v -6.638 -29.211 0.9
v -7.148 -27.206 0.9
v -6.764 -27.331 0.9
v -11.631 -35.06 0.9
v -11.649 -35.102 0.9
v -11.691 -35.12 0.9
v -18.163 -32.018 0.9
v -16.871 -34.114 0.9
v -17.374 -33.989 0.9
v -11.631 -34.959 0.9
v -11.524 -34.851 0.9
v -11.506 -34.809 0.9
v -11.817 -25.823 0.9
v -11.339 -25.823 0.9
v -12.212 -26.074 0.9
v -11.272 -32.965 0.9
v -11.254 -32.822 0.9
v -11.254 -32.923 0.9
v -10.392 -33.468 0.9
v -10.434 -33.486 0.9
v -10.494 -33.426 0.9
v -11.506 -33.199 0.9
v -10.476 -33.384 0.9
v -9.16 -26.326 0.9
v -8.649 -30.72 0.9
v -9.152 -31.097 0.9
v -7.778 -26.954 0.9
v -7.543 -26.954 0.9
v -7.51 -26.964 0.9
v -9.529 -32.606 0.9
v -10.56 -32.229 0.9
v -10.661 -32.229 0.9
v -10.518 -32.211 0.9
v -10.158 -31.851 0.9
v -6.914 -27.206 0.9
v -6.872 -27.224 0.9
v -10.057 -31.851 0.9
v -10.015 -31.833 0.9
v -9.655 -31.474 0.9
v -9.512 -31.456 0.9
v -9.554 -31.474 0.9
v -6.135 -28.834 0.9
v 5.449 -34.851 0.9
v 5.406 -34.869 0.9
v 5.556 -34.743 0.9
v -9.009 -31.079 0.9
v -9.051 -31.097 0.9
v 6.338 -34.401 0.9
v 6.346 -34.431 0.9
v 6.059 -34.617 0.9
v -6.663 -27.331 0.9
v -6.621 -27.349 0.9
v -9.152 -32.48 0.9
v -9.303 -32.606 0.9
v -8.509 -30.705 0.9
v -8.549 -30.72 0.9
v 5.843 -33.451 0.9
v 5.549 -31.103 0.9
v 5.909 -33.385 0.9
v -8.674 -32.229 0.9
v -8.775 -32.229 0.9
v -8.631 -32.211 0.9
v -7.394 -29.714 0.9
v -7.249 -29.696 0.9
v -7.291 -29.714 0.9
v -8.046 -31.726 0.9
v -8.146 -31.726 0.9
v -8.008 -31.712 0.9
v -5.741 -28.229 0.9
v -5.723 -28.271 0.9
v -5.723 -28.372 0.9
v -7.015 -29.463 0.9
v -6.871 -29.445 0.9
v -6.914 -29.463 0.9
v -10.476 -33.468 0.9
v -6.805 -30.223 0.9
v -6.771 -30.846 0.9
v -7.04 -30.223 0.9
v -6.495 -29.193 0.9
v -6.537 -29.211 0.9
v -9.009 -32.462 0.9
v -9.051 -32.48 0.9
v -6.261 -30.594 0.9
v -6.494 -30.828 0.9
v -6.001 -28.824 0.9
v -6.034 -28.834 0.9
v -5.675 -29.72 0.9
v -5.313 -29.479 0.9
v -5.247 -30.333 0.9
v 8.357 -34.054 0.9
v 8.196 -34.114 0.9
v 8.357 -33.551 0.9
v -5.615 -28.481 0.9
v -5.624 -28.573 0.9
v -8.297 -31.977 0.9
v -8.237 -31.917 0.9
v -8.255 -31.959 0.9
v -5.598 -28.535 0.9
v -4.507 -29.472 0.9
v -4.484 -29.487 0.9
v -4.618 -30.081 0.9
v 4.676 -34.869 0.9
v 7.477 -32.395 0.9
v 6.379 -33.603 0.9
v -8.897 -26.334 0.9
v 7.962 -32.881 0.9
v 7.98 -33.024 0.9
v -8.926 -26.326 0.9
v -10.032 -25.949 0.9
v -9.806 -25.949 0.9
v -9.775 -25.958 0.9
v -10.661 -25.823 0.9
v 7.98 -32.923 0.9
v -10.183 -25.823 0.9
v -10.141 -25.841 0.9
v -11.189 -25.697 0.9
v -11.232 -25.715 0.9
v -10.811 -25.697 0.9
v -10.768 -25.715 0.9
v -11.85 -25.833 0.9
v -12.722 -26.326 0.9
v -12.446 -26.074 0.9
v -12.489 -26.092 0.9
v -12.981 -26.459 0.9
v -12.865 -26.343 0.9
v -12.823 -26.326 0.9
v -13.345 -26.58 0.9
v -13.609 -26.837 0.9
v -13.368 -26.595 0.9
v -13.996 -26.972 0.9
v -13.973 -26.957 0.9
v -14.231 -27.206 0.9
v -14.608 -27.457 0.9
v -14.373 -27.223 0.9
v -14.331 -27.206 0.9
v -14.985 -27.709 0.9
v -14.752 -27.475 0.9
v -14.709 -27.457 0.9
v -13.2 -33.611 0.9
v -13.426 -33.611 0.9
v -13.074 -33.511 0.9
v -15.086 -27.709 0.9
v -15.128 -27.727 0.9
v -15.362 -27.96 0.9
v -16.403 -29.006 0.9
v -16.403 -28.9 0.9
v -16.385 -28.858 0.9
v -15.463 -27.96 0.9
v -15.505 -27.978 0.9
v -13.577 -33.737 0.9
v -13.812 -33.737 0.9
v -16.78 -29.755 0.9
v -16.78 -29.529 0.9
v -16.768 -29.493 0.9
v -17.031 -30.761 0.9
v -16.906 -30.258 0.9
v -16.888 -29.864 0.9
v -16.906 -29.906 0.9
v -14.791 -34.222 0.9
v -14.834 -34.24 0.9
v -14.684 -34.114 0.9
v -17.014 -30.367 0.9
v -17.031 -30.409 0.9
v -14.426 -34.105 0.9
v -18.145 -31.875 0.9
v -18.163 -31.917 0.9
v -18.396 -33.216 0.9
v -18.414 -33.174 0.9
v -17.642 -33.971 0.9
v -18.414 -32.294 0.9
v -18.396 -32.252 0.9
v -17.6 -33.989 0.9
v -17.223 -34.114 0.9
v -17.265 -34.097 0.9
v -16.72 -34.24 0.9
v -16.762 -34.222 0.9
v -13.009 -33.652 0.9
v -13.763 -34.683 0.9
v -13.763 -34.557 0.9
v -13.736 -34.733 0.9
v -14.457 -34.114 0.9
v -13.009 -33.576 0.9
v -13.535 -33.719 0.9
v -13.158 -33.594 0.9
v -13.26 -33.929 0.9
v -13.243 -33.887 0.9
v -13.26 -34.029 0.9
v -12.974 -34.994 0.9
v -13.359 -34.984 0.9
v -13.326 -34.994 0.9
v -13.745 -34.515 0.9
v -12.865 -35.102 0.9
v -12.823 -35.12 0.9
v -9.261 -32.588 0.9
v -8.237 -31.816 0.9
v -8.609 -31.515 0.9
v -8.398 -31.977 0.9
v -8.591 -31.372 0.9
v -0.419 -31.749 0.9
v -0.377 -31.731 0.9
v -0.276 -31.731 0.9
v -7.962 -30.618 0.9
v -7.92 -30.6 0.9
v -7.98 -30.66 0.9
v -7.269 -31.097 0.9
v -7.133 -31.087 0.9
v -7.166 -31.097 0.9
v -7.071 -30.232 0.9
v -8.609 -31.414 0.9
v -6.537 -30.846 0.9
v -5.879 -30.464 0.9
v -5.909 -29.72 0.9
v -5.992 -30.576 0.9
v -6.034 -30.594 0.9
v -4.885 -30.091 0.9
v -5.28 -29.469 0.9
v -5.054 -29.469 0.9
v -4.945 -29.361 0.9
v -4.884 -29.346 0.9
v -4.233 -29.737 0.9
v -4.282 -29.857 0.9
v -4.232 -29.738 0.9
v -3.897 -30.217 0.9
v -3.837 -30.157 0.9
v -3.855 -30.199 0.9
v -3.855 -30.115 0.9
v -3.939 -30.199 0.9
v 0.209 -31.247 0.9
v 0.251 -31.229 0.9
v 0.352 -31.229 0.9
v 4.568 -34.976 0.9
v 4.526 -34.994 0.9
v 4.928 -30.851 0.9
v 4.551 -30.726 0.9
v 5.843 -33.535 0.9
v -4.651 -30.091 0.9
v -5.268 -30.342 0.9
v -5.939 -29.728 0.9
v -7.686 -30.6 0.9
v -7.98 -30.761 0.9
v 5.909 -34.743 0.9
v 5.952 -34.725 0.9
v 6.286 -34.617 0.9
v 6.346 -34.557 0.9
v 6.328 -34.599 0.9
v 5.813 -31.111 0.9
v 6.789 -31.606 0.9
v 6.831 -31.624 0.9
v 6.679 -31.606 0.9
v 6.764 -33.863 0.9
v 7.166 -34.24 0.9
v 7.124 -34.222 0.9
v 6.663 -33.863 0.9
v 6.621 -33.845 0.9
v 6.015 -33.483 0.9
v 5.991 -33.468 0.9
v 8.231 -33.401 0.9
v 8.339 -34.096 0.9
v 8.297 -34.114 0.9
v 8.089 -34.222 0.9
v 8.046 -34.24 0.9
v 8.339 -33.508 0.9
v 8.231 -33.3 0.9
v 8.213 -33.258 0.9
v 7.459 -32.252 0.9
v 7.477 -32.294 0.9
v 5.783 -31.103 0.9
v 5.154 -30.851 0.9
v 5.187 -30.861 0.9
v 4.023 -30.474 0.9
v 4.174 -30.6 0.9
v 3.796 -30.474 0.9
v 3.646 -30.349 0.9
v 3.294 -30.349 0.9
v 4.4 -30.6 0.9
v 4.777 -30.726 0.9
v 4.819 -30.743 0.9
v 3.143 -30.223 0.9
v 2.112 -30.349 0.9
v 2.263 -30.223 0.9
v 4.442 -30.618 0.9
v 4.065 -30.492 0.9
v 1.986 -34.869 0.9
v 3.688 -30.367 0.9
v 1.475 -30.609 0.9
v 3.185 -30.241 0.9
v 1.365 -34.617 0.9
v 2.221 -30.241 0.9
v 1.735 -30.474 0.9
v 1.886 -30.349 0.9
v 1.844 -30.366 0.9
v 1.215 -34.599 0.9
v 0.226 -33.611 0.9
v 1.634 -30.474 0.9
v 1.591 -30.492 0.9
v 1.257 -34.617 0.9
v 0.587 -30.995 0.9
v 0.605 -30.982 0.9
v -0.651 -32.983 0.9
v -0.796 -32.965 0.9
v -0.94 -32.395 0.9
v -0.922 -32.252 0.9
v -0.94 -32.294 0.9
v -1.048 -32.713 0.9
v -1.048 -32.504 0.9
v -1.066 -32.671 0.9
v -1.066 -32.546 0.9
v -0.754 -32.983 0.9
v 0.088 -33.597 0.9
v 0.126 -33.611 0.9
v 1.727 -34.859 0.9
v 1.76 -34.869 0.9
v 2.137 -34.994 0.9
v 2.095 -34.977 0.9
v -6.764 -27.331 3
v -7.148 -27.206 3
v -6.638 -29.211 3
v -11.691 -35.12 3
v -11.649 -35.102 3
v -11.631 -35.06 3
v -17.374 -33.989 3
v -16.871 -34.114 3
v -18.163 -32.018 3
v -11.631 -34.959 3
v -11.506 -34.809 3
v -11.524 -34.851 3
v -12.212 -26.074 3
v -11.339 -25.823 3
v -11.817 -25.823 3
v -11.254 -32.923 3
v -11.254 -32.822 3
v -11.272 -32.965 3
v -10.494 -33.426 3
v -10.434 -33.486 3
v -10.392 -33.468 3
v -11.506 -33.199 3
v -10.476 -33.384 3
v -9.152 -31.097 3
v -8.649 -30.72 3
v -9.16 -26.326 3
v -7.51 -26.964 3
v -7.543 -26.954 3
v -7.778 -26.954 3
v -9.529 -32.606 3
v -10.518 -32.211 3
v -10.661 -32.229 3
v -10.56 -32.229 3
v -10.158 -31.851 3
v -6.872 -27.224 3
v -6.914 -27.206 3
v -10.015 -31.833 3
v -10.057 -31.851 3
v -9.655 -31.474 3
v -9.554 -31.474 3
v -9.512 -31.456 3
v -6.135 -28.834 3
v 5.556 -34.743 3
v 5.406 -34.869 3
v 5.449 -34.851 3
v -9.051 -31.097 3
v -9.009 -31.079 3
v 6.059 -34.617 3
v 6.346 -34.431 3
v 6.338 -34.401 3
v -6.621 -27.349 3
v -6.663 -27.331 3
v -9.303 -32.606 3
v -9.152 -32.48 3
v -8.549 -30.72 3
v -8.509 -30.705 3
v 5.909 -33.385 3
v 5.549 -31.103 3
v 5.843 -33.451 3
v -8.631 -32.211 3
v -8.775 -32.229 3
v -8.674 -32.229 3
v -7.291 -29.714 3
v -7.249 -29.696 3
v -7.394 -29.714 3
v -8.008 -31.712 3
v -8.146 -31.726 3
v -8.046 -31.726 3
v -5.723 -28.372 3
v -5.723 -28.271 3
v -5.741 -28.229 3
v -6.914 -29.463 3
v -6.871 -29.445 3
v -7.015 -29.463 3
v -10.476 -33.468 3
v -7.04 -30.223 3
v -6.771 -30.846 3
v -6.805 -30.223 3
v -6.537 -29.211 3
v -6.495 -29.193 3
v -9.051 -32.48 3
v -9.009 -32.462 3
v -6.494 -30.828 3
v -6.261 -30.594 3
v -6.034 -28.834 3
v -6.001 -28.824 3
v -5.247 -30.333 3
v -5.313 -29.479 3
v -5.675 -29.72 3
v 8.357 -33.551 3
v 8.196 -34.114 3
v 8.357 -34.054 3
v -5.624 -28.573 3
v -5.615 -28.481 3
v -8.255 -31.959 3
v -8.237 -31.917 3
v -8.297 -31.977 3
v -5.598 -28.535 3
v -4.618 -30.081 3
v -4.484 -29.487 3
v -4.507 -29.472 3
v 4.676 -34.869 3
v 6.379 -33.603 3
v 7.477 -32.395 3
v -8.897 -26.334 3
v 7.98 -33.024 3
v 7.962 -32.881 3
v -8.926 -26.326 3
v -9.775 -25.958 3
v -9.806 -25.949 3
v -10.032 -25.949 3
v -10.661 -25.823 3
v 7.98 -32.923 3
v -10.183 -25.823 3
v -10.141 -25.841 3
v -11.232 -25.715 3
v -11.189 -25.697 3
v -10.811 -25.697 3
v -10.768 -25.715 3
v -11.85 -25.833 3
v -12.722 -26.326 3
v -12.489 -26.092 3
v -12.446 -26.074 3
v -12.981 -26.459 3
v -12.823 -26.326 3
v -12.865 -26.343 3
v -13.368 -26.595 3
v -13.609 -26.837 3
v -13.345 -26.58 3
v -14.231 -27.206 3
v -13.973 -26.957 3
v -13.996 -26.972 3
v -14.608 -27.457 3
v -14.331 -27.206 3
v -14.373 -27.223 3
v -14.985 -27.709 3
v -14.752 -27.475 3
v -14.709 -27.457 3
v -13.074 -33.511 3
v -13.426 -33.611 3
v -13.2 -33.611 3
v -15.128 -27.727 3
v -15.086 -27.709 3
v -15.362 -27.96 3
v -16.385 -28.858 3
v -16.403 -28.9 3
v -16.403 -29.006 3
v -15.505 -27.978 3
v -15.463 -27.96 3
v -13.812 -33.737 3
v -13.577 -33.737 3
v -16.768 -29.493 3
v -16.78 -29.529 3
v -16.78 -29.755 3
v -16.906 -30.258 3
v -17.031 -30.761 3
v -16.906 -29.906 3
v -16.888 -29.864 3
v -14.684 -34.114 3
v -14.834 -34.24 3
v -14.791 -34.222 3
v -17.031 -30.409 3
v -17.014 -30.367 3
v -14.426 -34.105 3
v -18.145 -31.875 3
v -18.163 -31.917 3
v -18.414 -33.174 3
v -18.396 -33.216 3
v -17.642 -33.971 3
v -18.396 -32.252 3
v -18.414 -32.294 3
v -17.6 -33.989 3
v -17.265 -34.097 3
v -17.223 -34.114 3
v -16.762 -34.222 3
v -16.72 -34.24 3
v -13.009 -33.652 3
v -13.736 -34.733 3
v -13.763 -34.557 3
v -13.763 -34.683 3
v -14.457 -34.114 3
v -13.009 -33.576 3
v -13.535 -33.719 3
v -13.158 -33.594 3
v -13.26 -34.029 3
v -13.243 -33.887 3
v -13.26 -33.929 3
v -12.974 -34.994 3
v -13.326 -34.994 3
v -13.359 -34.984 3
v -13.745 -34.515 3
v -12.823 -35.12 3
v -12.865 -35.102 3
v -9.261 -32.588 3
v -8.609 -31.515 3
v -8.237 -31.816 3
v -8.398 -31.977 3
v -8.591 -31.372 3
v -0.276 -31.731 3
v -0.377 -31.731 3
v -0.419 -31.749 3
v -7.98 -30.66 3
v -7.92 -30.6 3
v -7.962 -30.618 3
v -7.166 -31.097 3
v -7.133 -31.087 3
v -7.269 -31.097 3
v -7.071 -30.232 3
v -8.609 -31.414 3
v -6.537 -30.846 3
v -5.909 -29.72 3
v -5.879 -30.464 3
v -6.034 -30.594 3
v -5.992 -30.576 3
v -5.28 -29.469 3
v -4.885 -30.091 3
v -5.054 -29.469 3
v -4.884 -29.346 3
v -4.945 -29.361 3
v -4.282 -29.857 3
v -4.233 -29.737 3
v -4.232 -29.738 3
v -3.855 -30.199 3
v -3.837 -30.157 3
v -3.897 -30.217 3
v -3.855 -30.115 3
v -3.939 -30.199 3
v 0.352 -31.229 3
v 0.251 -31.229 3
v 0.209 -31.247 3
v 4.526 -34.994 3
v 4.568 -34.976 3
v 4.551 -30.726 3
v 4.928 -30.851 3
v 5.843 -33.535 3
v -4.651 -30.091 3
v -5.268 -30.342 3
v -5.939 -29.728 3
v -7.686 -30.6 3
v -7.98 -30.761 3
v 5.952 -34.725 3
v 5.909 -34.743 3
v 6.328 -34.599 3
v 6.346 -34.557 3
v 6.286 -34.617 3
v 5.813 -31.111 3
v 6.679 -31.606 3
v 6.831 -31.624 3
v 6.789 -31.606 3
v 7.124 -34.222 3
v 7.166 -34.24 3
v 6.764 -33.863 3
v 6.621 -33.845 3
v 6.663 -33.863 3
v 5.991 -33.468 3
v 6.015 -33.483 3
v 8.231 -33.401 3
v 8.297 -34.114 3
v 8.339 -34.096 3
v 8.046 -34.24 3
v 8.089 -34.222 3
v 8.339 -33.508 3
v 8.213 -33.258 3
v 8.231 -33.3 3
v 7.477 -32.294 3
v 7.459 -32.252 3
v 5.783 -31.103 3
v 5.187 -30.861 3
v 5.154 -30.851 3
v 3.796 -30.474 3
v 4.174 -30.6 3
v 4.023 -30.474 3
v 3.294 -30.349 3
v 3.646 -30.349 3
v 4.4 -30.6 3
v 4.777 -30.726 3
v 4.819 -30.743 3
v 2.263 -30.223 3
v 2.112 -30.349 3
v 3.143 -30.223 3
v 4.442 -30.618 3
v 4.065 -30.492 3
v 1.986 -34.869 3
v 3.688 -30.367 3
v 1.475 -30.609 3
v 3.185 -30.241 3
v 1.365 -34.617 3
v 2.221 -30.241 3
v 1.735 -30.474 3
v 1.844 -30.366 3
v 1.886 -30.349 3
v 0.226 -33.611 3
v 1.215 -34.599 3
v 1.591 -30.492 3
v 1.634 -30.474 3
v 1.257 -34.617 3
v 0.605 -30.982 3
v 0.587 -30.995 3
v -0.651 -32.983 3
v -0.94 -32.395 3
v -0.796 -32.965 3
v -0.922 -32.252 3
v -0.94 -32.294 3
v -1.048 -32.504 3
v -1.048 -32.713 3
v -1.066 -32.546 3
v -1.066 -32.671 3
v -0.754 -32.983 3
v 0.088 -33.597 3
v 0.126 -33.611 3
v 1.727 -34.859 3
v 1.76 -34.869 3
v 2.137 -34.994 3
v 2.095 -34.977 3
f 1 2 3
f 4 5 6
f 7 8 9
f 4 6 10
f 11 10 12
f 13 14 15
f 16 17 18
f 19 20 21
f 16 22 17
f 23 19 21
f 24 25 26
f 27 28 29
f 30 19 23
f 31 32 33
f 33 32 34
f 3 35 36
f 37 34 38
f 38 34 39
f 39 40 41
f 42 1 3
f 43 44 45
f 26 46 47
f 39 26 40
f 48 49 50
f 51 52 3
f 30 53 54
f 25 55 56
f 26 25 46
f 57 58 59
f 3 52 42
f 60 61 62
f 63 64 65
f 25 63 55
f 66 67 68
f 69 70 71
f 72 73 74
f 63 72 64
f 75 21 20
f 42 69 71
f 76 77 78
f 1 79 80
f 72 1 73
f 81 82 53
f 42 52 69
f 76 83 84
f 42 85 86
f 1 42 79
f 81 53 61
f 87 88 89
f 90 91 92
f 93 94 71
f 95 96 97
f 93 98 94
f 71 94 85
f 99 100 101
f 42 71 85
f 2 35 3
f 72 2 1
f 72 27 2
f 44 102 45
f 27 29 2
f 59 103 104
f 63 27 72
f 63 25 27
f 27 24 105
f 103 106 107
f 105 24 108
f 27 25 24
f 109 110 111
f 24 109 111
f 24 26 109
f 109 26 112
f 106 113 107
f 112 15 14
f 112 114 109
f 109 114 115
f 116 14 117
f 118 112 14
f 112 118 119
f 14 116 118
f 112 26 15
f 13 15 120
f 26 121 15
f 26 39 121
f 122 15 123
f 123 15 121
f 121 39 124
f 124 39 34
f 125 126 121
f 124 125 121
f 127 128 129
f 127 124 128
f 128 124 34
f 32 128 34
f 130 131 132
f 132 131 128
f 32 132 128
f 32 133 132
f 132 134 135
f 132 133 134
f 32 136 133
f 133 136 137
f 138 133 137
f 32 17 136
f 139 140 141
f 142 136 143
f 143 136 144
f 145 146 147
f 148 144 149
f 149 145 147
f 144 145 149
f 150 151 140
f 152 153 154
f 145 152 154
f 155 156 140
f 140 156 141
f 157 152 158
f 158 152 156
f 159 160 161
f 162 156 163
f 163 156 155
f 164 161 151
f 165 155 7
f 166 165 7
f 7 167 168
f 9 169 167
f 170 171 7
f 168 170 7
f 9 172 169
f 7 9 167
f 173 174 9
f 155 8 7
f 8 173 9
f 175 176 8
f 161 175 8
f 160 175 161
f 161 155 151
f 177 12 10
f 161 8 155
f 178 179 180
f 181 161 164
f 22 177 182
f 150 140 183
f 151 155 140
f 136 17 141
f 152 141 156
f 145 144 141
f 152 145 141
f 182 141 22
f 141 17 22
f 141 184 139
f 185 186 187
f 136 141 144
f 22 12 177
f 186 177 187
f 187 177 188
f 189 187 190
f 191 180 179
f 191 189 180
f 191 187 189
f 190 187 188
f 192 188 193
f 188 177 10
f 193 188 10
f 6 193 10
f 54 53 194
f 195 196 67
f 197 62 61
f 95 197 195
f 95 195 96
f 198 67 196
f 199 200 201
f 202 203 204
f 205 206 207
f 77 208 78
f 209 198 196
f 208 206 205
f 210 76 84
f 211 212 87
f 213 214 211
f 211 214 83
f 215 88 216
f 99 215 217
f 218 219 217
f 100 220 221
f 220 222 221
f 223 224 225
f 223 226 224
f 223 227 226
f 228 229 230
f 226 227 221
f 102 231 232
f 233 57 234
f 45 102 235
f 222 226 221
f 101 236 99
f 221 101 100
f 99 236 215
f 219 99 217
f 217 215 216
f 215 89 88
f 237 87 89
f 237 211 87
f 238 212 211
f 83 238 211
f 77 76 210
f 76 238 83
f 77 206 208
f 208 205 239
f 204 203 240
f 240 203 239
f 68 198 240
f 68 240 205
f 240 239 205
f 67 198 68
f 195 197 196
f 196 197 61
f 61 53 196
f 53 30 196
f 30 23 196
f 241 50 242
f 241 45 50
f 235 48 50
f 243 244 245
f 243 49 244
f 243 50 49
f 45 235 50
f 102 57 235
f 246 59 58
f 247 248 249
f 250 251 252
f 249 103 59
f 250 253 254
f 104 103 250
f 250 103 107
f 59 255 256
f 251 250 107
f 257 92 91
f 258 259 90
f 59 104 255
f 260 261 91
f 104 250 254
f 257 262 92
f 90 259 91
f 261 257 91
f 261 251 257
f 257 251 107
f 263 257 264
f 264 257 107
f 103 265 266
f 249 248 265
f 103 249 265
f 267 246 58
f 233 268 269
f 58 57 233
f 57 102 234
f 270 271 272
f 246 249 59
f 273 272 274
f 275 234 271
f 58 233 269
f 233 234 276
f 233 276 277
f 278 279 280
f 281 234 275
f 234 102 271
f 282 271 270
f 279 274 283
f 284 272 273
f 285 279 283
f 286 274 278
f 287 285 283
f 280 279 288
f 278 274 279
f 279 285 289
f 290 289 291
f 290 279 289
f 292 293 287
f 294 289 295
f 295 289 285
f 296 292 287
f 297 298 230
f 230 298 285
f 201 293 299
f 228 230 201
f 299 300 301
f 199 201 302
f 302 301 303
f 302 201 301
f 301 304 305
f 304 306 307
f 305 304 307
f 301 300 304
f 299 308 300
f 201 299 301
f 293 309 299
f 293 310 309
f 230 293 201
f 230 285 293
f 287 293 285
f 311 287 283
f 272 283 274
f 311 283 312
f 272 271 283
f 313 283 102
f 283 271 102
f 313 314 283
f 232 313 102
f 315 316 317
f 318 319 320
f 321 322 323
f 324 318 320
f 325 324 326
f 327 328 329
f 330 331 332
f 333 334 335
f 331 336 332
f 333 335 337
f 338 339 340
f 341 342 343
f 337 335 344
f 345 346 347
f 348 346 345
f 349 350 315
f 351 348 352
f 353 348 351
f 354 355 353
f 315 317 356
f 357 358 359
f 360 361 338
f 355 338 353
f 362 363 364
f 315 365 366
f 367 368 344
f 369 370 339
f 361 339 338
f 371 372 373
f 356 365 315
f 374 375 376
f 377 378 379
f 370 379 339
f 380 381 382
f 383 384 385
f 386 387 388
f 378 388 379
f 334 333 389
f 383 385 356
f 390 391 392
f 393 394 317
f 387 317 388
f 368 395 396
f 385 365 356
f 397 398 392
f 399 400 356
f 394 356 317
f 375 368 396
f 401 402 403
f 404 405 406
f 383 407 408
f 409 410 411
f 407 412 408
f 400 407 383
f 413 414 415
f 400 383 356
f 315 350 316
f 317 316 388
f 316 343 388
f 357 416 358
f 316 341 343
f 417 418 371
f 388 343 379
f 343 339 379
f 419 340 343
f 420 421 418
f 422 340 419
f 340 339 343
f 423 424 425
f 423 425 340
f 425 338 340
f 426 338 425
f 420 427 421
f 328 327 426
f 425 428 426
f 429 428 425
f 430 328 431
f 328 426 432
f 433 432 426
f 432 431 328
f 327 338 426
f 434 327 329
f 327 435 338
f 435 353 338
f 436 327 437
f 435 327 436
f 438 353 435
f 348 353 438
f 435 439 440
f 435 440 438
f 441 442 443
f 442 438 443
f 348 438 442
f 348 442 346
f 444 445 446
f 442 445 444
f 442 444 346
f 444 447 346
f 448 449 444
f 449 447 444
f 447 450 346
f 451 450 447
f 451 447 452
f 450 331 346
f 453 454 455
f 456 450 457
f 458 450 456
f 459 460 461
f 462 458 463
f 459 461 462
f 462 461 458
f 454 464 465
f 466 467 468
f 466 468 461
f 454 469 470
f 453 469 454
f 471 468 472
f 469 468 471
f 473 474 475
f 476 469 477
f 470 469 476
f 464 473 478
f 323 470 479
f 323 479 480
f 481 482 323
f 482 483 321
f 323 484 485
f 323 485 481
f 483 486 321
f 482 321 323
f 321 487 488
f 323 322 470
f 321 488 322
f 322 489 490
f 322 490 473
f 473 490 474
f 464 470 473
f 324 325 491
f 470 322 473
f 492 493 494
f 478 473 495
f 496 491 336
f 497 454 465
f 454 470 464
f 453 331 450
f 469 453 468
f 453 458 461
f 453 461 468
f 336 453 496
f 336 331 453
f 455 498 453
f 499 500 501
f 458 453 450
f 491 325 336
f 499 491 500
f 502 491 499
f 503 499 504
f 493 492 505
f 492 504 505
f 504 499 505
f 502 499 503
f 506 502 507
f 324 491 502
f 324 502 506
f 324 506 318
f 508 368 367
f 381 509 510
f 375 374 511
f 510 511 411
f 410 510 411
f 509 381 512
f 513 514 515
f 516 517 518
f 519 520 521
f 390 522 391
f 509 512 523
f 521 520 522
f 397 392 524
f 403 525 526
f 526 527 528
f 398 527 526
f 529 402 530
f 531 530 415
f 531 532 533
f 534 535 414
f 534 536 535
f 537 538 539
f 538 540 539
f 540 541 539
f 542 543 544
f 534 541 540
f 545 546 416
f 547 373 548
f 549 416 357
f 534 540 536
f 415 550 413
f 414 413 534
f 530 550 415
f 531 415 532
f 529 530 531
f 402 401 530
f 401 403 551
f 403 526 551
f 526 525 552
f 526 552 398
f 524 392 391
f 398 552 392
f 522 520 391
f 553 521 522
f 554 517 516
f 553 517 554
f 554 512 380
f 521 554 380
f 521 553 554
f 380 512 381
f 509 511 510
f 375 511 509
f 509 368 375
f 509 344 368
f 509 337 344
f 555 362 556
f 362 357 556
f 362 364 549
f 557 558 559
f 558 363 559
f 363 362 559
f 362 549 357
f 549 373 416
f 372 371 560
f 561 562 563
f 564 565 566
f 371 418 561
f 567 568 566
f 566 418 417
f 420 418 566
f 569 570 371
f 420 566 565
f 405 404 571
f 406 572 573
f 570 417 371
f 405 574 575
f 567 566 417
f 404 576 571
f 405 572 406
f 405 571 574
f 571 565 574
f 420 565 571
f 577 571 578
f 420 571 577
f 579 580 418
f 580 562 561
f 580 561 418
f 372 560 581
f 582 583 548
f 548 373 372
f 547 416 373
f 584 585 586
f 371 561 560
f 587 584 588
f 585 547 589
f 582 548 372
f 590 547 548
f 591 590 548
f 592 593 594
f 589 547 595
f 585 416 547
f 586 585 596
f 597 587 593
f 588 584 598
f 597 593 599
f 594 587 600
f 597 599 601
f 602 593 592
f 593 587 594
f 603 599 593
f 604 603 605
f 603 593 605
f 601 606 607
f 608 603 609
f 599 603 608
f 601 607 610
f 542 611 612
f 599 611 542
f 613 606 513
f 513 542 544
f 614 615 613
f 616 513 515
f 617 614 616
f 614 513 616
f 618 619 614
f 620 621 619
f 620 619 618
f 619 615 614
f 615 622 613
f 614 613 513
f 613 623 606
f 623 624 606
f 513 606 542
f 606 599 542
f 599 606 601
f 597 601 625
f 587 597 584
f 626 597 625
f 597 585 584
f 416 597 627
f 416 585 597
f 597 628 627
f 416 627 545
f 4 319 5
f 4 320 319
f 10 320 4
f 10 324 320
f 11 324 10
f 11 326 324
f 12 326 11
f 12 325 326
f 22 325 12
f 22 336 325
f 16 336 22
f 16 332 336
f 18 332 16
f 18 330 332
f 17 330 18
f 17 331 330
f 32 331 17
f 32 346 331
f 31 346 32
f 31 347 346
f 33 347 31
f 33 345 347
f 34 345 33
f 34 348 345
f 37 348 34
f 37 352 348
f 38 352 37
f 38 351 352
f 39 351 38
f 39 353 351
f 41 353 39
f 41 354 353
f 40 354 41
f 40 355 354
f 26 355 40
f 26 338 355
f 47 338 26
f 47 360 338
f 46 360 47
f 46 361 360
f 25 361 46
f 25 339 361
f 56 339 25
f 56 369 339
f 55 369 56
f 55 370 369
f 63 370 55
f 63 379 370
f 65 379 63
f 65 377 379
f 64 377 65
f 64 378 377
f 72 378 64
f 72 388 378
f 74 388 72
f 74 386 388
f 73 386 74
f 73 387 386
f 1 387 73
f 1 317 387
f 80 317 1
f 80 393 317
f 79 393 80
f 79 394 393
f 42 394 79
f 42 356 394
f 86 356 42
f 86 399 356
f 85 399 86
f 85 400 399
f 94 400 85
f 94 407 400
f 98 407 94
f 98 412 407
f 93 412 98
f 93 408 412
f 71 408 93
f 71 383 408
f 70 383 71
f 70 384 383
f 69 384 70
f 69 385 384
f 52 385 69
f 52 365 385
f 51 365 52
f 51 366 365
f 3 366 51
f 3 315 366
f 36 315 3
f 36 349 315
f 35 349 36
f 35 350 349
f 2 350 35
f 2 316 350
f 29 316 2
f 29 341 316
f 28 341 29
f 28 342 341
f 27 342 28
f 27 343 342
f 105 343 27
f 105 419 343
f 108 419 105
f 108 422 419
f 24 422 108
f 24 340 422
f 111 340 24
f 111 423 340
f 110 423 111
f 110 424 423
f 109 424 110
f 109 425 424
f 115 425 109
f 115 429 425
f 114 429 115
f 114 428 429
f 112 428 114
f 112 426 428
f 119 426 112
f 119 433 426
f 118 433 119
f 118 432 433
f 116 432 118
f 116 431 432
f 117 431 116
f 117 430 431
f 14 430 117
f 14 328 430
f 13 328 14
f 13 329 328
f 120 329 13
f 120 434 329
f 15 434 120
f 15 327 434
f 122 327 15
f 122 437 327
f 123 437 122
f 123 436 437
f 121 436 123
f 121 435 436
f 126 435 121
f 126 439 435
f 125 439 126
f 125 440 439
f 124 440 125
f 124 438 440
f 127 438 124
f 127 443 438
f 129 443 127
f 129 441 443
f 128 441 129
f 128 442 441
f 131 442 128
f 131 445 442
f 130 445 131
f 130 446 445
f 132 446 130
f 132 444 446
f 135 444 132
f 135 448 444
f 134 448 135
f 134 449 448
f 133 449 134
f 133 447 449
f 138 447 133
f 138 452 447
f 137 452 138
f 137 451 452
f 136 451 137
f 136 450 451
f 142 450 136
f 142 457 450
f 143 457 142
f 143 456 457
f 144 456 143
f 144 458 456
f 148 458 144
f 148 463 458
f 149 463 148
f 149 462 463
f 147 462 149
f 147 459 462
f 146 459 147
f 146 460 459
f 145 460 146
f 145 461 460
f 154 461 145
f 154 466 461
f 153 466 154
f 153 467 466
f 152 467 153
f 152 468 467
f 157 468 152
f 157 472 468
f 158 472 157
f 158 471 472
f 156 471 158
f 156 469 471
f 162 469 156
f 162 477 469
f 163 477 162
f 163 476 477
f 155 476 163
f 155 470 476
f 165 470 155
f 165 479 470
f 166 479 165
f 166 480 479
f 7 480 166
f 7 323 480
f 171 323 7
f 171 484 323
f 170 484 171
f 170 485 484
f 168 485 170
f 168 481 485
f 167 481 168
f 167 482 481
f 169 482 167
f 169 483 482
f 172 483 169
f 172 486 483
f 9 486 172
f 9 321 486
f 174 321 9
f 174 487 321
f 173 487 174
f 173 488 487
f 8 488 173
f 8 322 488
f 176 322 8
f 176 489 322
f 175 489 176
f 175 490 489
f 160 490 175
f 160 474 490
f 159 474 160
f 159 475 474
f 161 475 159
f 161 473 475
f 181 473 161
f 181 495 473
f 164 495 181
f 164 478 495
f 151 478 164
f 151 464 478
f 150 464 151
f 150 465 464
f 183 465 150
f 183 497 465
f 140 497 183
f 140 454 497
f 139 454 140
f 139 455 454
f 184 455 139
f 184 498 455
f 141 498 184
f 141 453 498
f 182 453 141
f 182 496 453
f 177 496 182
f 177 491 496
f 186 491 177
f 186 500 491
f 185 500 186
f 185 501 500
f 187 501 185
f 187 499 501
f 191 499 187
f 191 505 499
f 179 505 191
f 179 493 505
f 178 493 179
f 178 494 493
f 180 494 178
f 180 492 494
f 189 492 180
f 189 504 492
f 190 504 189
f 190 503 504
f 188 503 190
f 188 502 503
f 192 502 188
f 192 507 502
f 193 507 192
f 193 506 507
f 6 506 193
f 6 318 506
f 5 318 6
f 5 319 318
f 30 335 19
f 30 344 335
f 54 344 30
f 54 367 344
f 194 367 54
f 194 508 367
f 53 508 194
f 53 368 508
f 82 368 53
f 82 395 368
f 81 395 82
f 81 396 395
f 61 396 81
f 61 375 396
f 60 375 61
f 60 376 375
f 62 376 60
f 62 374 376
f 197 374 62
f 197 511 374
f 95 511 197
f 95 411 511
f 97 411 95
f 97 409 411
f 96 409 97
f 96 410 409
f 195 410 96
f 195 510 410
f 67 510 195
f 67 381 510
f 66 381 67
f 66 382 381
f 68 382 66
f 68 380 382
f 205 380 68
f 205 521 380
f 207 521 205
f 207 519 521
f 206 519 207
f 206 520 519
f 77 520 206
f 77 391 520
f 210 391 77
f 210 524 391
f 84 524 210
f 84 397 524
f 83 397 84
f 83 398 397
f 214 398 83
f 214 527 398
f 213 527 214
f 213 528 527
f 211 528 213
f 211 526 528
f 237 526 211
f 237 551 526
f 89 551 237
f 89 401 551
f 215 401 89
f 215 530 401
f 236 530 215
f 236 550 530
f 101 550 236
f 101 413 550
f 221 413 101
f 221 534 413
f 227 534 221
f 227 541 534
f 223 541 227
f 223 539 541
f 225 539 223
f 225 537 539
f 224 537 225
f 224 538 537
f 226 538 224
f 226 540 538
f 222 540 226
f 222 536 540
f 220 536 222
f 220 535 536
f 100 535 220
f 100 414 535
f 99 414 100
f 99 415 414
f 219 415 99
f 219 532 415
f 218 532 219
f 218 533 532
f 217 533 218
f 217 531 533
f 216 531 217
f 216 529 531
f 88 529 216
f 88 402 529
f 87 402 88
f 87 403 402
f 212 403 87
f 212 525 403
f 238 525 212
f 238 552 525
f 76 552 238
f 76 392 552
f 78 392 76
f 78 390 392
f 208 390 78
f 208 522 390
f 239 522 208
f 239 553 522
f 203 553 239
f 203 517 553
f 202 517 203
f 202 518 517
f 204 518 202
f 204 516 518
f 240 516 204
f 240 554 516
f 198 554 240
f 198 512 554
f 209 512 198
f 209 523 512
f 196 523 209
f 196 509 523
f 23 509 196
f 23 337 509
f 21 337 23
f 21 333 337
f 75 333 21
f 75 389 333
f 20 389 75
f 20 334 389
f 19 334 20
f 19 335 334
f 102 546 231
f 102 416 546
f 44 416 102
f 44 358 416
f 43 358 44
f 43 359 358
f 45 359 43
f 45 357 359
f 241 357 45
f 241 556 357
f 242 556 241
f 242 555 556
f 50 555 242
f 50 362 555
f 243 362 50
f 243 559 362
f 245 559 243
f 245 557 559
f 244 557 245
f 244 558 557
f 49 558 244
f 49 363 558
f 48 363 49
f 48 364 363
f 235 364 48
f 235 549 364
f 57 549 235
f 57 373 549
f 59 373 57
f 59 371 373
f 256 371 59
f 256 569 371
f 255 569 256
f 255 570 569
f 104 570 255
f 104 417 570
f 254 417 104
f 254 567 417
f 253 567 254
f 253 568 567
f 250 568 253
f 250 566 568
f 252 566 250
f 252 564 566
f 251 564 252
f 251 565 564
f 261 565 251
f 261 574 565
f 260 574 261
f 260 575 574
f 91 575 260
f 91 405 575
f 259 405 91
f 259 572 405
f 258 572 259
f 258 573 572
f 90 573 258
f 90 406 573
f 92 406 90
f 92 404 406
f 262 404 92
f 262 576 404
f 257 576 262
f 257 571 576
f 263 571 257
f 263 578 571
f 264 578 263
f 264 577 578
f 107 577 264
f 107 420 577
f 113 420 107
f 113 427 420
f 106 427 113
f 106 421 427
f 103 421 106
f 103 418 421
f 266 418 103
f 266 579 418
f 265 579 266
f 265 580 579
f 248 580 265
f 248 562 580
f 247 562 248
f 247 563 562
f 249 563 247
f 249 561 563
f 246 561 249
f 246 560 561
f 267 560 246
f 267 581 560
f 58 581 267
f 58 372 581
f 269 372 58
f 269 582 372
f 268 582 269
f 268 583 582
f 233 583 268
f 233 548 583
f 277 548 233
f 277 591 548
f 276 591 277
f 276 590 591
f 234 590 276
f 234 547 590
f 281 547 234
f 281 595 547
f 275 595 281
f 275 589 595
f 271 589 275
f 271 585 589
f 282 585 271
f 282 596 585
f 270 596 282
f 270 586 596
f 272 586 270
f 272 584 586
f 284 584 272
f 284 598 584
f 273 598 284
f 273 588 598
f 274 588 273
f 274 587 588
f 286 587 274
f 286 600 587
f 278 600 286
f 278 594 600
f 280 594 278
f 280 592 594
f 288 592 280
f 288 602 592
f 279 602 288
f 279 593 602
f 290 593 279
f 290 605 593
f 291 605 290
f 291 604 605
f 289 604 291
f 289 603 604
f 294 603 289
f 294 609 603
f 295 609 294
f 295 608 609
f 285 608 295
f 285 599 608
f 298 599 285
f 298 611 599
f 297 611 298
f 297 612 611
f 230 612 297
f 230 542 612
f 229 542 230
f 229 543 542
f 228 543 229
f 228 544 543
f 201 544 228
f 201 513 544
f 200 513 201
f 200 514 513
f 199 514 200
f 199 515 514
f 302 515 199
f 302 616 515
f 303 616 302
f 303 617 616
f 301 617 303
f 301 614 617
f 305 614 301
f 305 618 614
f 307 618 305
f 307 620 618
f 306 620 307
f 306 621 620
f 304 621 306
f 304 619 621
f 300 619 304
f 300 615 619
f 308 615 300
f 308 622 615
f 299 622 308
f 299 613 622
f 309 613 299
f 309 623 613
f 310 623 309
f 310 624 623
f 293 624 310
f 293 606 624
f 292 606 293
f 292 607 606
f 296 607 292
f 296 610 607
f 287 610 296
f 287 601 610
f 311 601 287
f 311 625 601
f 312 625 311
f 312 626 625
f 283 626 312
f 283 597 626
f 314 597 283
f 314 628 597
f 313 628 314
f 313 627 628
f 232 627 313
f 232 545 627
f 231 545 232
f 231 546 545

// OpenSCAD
$fn = 24;
translate([0, -2.500, 0.900])
  linear_extrude(height=2.100) {
offset(r=0.06, $fn=8) {
    polygon(points=[[-1.006,-30.046],[-1.006,-30.171],[-0.754,-30.423],[-0.629,-30.423],[0.126,-31.051],[0.251,-31.051],[1.257,-32.057],[1.383,-32.057],[1.760,-32.309],[2.011,-32.309],[2.137,-32.434],[4.526,-32.434],[4.651,-32.309],[5.406,-32.309],[5.531,-32.183],[5.909,-32.183],[6.034,-32.057],[6.286,-32.057],[6.286,-31.931],[5.783,-31.051],[5.783,-30.926],[5.909,-30.800],[6.034,-30.926],[6.411,-31.051],[6.663,-31.303],[6.789,-31.303],[7.166,-31.680],[8.046,-31.680],[8.171,-31.554],[8.297,-31.554],[8.297,-31.051],[8.171,-30.926],[8.171,-30.800],[7.920,-30.549],[7.920,-30.423],[7.417,-29.920],[7.417,-29.794],[6.789,-29.166],[6.663,-29.166],[5.783,-28.663],[5.531,-28.663],[5.154,-28.411],[4.903,-28.411],[4.777,-28.286],[4.526,-28.286],[4.400,-28.160],[4.149,-28.160],[4.023,-28.034],[3.771,-28.034],[3.646,-27.909],[3.269,-27.909],[3.143,-27.783],[2.263,-27.783],[2.137,-27.909],[1.886,-27.909],[1.760,-28.034],[1.634,-28.034],[1.509,-28.160],[0.629,-28.537],[0.377,-28.789],[0.251,-28.789],[-0.251,-29.291],[-0.377,-29.291],[-0.880,-29.794],[-0.880,-29.920]], paths=[[0,1,2,3,4,5,6,7,8,9,10,11,12,13,14,15,16,17,18,19,20,21,22,23,24,25,26,27,28,29,30,31,32,33,34,35,36,37,38,39,40,41,42,43,44,45,46,47,48,49,50,51,52,53,54,55,56,57,58,59,60,61,62,63,64]]);
    polygon(points=[[-3.897,-27.657],[-4.526,-27.029],[-4.903,-26.903],[-5.029,-27.029],[-5.280,-27.029],[-5.657,-27.280],[-5.909,-27.280],[-6.789,-27.783],[-7.040,-27.783],[-7.669,-28.160],[-7.920,-28.160],[-7.920,-28.286],[-8.549,-28.914],[-8.549,-29.040],[-10.434,-30.926],[-10.434,-31.051],[-10.434,-30.926],[-9.554,-30.046],[-9.303,-30.046],[-9.177,-29.920],[-9.051,-29.920],[-8.800,-29.669],[-8.674,-29.669],[-8.423,-29.417],[-8.297,-29.417],[-8.297,-29.291],[-8.171,-29.166],[-8.046,-29.166],[-7.291,-28.537],[-7.166,-28.537],[-6.789,-28.286],[-6.537,-28.286],[-6.286,-28.034],[-6.034,-28.034],[-5.909,-27.909],[-5.280,-27.783],[-4.903,-27.531],[-4.651,-27.531],[-4.274,-27.280]], paths=[[0,1,2,3,4,5,6,7,8,9,10,11,12,13,14,15,16,17,18,19,20,21,22,23,24,25,26,27,28,29,30,31,32,33,34,35,36,37,38]]);
    polygon(points=[[-5.657,-26.023],[-5.783,-25.897],[-5.783,-25.771],[-6.663,-24.891],[-6.789,-24.891],[-6.914,-24.766],[-7.166,-24.766],[-7.543,-24.514],[-7.794,-24.514],[-8.926,-23.886],[-9.177,-23.886],[-9.806,-23.509],[-10.057,-23.509],[-10.183,-23.383],[-10.686,-23.383],[-10.811,-23.257],[-11.189,-23.257],[-11.314,-23.383],[-11.817,-23.383],[-12.194,-23.634],[-12.446,-23.634],[-12.697,-23.886],[-12.823,-23.886],[-12.949,-24.011],[-13.326,-24.137],[-13.577,-24.389],[-13.954,-24.514],[-14.206,-24.766],[-14.331,-24.766],[-14.583,-25.017],[-14.709,-25.017],[-14.960,-25.269],[-15.086,-25.269],[-15.337,-25.520],[-15.463,-25.520],[-16.343,-26.400],[-16.343,-26.526],[-16.720,-27.029],[-16.720,-27.280],[-16.846,-27.406],[-16.846,-27.783],[-16.971,-27.909],[-16.971,-28.286],[-18.103,-29.417],[-18.103,-29.543],[-18.354,-29.794],[-18.354,-30.674],[-17.600,-31.429],[-17.349,-31.429],[-17.223,-31.554],[-16.846,-31.554],[-16.720,-31.680],[-14.834,-31.680],[-14.709,-31.554],[-14.457,-31.554],[-13.829,-31.177],[-13.577,-31.177],[-13.451,-31.051],[-13.200,-31.051],[-13.074,-30.926],[-12.949,-31.051],[-12.949,-31.177],[-13.200,-31.429],[-13.200,-31.554],[-13.703,-32.057],[-13.703,-32.183],[-13.326,-32.434],[-12.949,-32.434],[-12.823,-32.560],[-11.691,-32.560],[-11.691,-32.434],[-11.566,-32.309],[-11.566,-30.674],[-11.314,-30.423],[-11.314,-30.297],[-10.686,-29.669],[-10.560,-29.669],[-10.183,-29.291],[-10.057,-29.291],[-9.680,-28.914],[-9.554,-28.914],[-9.177,-28.537],[-9.051,-28.537],[-8.674,-28.160],[-8.549,-28.160],[-7.417,-27.154],[-7.291,-27.154],[-7.040,-26.903],[-6.914,-26.903],[-6.663,-26.651],[-6.537,-26.651],[-6.160,-26.274],[-6.034,-26.274]], paths=[[0,1,2,3,4,5,6,7,8,9,10,11,12,13,14,15,16,17,18,19,20,21,22,23,24,25,26,27,28,29,30,31,32,33,34,35,36,37,38,39,40,41,42,43,44,45,46,47,48,49,50,51,52,53,54,55,56,57,58,59,60,61,62,63,64,65,66,67,68,69,70,71,72,73,74,75,76,77,78,79,80,81,82,83,84,85,86,87,88,89,90,91,92]]);
}
}
